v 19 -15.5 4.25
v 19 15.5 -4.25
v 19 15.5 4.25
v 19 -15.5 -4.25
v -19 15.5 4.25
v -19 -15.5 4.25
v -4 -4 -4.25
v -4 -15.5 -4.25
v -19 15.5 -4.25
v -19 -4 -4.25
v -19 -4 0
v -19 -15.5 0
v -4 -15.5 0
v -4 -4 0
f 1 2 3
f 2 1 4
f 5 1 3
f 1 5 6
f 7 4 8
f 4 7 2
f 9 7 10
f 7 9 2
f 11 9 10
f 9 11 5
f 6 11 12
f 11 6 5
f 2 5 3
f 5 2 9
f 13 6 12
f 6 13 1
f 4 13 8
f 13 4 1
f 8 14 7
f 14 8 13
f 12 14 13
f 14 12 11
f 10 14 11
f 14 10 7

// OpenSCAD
module extrusion_bracket() {
    difference() {
        cube([38, 31, 8.5], center = true);
        translate([-19, -15.5, -4.25])
            cube([30, 23, 8.5], center = true);
    }
}

extrusion_bracket();
